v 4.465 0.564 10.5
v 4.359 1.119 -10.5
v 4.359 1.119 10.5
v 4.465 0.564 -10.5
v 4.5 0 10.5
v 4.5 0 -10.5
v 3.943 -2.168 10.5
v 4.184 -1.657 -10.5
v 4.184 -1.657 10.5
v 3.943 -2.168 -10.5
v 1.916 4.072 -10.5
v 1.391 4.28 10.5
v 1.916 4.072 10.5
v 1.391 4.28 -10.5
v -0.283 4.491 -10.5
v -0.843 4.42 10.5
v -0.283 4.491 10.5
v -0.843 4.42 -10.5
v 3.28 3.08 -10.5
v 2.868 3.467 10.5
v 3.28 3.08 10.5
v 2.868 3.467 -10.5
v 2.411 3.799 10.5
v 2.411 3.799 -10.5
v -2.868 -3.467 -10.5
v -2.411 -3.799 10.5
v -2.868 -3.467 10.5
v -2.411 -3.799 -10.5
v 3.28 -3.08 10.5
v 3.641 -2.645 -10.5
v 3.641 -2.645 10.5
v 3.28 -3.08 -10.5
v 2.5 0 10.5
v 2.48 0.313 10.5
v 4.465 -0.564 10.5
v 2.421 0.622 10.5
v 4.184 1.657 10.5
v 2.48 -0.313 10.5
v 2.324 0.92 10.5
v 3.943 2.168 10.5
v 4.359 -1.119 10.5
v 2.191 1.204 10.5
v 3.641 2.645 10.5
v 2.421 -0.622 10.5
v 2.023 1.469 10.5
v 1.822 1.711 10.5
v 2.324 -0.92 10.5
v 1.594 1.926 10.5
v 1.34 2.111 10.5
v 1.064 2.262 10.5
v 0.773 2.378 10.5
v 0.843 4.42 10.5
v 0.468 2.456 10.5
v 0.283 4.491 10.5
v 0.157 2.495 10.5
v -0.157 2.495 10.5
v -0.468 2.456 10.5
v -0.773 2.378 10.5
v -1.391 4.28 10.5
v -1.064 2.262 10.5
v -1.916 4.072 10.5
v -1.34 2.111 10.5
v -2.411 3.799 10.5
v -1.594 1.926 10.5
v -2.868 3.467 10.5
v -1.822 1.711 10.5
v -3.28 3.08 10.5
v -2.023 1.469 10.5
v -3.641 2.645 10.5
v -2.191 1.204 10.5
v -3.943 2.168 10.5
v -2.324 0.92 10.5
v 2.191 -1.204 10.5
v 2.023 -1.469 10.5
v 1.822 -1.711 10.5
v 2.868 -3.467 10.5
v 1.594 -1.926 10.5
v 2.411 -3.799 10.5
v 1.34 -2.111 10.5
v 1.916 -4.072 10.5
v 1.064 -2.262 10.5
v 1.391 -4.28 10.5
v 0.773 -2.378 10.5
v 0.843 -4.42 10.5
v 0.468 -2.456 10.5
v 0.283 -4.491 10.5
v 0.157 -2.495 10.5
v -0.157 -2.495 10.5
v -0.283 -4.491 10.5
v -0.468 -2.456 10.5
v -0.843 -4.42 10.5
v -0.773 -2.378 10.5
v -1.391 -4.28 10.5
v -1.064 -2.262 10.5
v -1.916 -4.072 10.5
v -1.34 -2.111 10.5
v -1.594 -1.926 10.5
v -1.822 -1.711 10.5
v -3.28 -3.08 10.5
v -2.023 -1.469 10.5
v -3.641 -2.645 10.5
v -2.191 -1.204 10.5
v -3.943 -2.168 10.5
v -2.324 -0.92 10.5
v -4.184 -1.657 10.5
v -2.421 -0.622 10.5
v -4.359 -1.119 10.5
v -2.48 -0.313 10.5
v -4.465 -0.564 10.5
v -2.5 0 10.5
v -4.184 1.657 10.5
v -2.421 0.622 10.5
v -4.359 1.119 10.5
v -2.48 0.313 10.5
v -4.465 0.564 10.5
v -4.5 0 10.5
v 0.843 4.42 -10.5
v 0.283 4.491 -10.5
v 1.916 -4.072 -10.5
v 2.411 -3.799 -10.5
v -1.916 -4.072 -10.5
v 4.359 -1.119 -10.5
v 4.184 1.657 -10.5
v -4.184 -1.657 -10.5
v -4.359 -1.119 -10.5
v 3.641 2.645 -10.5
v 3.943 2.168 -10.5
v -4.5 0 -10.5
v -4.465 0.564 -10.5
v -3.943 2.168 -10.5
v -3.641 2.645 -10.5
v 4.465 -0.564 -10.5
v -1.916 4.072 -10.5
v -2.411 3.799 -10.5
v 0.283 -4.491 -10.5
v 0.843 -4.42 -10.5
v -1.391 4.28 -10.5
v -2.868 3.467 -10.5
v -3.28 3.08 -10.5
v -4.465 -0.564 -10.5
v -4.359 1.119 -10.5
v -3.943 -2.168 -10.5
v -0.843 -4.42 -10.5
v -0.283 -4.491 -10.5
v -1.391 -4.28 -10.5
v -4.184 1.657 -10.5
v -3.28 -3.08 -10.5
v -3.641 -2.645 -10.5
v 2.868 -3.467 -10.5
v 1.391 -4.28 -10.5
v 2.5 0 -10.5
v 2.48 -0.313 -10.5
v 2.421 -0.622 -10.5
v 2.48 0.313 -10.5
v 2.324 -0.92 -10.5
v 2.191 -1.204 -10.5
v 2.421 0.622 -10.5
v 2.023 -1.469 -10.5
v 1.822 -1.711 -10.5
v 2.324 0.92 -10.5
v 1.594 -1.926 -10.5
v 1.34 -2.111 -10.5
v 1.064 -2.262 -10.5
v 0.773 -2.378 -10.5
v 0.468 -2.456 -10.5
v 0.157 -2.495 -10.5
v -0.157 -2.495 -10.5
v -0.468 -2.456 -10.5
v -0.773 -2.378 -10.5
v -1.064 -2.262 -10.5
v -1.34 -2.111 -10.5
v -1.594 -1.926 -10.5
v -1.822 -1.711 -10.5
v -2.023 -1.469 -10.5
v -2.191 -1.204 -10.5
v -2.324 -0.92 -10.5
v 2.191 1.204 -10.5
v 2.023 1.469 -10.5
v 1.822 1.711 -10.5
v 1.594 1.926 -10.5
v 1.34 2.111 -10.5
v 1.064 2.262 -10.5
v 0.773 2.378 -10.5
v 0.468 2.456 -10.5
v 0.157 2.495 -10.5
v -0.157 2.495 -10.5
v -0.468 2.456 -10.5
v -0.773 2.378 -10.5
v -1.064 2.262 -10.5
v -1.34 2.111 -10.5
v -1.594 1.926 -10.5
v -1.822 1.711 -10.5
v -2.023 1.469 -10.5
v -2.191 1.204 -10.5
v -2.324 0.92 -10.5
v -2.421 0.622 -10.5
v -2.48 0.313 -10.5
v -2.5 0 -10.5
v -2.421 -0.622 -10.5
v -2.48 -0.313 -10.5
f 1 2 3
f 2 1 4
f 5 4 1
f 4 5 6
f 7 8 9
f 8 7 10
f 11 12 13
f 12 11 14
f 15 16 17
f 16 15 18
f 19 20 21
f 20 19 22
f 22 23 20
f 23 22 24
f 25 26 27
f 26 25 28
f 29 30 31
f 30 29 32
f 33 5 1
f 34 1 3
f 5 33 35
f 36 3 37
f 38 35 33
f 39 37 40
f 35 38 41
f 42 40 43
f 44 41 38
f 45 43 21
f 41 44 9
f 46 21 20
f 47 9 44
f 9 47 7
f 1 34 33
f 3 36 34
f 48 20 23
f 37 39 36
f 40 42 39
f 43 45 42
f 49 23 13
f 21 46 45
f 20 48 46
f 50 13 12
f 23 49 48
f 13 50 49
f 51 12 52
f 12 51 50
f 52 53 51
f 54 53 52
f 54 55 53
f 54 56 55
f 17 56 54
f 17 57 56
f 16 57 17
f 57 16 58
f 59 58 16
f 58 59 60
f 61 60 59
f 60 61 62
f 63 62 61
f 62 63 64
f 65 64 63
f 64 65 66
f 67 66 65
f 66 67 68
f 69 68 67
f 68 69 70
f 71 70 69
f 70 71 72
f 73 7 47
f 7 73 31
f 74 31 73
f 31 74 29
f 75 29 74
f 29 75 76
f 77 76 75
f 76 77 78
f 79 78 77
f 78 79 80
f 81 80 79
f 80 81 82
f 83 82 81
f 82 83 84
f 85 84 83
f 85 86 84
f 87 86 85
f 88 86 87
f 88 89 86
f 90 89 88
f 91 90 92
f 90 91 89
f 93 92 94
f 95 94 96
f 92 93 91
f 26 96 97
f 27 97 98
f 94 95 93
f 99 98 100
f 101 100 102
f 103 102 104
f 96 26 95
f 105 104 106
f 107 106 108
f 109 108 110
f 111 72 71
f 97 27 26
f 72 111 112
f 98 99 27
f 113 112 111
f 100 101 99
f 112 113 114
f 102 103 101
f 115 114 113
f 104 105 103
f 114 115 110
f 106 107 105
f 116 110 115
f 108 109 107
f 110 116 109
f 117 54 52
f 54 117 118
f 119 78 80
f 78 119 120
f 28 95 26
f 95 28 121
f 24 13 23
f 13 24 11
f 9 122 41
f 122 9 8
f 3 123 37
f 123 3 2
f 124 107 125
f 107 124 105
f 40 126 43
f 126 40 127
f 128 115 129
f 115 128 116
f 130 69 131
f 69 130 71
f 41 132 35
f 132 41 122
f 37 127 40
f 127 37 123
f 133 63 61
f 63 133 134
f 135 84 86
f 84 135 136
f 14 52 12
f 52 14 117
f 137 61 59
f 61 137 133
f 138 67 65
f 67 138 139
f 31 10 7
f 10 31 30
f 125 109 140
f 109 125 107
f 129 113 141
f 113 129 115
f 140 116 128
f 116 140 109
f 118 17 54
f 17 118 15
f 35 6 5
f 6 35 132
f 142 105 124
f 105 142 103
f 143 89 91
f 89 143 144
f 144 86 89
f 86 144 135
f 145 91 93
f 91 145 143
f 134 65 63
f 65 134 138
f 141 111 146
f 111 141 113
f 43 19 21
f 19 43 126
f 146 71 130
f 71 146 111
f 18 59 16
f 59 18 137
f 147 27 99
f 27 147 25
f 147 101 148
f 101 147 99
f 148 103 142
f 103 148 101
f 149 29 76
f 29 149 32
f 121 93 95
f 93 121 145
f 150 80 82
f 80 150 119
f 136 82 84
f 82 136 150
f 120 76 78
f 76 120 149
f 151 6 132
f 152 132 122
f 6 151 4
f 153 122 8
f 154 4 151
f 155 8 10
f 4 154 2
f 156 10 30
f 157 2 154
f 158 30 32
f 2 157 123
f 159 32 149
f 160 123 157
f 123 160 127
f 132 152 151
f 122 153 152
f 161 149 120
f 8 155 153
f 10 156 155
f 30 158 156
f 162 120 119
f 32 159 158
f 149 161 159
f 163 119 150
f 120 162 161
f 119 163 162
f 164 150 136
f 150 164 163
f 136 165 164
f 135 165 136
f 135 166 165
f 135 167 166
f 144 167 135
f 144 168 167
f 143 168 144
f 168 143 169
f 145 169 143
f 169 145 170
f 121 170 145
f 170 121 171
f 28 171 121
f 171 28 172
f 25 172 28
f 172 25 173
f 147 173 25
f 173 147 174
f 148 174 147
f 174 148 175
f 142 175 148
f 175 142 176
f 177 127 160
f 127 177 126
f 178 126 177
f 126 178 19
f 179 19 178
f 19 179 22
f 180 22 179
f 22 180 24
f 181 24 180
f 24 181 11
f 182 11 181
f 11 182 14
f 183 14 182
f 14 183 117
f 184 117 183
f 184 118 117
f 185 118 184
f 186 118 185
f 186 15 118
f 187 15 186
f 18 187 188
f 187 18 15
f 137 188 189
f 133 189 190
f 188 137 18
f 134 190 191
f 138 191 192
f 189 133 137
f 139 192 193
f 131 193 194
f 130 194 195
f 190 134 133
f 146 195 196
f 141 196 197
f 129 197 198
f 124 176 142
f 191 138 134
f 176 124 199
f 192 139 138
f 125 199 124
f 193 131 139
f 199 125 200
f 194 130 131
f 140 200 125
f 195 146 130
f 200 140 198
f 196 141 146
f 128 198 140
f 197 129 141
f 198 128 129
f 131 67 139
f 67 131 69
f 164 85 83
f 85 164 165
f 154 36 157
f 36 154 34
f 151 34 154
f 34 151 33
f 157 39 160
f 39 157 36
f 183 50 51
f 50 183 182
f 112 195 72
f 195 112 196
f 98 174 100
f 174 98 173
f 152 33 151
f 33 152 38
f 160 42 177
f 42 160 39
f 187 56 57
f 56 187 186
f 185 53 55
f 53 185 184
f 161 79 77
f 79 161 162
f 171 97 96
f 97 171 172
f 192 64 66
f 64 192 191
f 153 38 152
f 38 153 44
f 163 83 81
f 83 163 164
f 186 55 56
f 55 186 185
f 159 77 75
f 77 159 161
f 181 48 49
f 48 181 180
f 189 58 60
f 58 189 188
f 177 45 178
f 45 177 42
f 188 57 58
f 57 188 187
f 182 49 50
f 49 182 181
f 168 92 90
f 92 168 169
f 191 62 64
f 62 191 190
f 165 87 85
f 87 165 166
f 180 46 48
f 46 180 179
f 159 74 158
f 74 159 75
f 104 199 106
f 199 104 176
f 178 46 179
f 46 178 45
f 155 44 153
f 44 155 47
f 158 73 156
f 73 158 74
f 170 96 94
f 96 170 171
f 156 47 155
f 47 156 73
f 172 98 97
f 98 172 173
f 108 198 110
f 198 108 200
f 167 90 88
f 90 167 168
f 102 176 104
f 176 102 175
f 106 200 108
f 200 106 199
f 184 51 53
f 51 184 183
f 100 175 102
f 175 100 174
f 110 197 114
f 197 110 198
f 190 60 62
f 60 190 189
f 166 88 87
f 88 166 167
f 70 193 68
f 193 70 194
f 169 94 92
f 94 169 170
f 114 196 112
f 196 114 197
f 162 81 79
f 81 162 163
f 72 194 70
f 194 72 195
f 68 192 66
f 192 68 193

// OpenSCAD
$fn = 50;


difference() {
	union() {
		translate(v = [0, 0, -10.5000000000]) {
			cylinder(h = 21, r = 4.5000000000);
		}
	}
	union() {
		translate(v = [0, 0, -100.0000000000]) {
			cylinder(h = 200, r = 2.5000000000);
		}
	}
}
